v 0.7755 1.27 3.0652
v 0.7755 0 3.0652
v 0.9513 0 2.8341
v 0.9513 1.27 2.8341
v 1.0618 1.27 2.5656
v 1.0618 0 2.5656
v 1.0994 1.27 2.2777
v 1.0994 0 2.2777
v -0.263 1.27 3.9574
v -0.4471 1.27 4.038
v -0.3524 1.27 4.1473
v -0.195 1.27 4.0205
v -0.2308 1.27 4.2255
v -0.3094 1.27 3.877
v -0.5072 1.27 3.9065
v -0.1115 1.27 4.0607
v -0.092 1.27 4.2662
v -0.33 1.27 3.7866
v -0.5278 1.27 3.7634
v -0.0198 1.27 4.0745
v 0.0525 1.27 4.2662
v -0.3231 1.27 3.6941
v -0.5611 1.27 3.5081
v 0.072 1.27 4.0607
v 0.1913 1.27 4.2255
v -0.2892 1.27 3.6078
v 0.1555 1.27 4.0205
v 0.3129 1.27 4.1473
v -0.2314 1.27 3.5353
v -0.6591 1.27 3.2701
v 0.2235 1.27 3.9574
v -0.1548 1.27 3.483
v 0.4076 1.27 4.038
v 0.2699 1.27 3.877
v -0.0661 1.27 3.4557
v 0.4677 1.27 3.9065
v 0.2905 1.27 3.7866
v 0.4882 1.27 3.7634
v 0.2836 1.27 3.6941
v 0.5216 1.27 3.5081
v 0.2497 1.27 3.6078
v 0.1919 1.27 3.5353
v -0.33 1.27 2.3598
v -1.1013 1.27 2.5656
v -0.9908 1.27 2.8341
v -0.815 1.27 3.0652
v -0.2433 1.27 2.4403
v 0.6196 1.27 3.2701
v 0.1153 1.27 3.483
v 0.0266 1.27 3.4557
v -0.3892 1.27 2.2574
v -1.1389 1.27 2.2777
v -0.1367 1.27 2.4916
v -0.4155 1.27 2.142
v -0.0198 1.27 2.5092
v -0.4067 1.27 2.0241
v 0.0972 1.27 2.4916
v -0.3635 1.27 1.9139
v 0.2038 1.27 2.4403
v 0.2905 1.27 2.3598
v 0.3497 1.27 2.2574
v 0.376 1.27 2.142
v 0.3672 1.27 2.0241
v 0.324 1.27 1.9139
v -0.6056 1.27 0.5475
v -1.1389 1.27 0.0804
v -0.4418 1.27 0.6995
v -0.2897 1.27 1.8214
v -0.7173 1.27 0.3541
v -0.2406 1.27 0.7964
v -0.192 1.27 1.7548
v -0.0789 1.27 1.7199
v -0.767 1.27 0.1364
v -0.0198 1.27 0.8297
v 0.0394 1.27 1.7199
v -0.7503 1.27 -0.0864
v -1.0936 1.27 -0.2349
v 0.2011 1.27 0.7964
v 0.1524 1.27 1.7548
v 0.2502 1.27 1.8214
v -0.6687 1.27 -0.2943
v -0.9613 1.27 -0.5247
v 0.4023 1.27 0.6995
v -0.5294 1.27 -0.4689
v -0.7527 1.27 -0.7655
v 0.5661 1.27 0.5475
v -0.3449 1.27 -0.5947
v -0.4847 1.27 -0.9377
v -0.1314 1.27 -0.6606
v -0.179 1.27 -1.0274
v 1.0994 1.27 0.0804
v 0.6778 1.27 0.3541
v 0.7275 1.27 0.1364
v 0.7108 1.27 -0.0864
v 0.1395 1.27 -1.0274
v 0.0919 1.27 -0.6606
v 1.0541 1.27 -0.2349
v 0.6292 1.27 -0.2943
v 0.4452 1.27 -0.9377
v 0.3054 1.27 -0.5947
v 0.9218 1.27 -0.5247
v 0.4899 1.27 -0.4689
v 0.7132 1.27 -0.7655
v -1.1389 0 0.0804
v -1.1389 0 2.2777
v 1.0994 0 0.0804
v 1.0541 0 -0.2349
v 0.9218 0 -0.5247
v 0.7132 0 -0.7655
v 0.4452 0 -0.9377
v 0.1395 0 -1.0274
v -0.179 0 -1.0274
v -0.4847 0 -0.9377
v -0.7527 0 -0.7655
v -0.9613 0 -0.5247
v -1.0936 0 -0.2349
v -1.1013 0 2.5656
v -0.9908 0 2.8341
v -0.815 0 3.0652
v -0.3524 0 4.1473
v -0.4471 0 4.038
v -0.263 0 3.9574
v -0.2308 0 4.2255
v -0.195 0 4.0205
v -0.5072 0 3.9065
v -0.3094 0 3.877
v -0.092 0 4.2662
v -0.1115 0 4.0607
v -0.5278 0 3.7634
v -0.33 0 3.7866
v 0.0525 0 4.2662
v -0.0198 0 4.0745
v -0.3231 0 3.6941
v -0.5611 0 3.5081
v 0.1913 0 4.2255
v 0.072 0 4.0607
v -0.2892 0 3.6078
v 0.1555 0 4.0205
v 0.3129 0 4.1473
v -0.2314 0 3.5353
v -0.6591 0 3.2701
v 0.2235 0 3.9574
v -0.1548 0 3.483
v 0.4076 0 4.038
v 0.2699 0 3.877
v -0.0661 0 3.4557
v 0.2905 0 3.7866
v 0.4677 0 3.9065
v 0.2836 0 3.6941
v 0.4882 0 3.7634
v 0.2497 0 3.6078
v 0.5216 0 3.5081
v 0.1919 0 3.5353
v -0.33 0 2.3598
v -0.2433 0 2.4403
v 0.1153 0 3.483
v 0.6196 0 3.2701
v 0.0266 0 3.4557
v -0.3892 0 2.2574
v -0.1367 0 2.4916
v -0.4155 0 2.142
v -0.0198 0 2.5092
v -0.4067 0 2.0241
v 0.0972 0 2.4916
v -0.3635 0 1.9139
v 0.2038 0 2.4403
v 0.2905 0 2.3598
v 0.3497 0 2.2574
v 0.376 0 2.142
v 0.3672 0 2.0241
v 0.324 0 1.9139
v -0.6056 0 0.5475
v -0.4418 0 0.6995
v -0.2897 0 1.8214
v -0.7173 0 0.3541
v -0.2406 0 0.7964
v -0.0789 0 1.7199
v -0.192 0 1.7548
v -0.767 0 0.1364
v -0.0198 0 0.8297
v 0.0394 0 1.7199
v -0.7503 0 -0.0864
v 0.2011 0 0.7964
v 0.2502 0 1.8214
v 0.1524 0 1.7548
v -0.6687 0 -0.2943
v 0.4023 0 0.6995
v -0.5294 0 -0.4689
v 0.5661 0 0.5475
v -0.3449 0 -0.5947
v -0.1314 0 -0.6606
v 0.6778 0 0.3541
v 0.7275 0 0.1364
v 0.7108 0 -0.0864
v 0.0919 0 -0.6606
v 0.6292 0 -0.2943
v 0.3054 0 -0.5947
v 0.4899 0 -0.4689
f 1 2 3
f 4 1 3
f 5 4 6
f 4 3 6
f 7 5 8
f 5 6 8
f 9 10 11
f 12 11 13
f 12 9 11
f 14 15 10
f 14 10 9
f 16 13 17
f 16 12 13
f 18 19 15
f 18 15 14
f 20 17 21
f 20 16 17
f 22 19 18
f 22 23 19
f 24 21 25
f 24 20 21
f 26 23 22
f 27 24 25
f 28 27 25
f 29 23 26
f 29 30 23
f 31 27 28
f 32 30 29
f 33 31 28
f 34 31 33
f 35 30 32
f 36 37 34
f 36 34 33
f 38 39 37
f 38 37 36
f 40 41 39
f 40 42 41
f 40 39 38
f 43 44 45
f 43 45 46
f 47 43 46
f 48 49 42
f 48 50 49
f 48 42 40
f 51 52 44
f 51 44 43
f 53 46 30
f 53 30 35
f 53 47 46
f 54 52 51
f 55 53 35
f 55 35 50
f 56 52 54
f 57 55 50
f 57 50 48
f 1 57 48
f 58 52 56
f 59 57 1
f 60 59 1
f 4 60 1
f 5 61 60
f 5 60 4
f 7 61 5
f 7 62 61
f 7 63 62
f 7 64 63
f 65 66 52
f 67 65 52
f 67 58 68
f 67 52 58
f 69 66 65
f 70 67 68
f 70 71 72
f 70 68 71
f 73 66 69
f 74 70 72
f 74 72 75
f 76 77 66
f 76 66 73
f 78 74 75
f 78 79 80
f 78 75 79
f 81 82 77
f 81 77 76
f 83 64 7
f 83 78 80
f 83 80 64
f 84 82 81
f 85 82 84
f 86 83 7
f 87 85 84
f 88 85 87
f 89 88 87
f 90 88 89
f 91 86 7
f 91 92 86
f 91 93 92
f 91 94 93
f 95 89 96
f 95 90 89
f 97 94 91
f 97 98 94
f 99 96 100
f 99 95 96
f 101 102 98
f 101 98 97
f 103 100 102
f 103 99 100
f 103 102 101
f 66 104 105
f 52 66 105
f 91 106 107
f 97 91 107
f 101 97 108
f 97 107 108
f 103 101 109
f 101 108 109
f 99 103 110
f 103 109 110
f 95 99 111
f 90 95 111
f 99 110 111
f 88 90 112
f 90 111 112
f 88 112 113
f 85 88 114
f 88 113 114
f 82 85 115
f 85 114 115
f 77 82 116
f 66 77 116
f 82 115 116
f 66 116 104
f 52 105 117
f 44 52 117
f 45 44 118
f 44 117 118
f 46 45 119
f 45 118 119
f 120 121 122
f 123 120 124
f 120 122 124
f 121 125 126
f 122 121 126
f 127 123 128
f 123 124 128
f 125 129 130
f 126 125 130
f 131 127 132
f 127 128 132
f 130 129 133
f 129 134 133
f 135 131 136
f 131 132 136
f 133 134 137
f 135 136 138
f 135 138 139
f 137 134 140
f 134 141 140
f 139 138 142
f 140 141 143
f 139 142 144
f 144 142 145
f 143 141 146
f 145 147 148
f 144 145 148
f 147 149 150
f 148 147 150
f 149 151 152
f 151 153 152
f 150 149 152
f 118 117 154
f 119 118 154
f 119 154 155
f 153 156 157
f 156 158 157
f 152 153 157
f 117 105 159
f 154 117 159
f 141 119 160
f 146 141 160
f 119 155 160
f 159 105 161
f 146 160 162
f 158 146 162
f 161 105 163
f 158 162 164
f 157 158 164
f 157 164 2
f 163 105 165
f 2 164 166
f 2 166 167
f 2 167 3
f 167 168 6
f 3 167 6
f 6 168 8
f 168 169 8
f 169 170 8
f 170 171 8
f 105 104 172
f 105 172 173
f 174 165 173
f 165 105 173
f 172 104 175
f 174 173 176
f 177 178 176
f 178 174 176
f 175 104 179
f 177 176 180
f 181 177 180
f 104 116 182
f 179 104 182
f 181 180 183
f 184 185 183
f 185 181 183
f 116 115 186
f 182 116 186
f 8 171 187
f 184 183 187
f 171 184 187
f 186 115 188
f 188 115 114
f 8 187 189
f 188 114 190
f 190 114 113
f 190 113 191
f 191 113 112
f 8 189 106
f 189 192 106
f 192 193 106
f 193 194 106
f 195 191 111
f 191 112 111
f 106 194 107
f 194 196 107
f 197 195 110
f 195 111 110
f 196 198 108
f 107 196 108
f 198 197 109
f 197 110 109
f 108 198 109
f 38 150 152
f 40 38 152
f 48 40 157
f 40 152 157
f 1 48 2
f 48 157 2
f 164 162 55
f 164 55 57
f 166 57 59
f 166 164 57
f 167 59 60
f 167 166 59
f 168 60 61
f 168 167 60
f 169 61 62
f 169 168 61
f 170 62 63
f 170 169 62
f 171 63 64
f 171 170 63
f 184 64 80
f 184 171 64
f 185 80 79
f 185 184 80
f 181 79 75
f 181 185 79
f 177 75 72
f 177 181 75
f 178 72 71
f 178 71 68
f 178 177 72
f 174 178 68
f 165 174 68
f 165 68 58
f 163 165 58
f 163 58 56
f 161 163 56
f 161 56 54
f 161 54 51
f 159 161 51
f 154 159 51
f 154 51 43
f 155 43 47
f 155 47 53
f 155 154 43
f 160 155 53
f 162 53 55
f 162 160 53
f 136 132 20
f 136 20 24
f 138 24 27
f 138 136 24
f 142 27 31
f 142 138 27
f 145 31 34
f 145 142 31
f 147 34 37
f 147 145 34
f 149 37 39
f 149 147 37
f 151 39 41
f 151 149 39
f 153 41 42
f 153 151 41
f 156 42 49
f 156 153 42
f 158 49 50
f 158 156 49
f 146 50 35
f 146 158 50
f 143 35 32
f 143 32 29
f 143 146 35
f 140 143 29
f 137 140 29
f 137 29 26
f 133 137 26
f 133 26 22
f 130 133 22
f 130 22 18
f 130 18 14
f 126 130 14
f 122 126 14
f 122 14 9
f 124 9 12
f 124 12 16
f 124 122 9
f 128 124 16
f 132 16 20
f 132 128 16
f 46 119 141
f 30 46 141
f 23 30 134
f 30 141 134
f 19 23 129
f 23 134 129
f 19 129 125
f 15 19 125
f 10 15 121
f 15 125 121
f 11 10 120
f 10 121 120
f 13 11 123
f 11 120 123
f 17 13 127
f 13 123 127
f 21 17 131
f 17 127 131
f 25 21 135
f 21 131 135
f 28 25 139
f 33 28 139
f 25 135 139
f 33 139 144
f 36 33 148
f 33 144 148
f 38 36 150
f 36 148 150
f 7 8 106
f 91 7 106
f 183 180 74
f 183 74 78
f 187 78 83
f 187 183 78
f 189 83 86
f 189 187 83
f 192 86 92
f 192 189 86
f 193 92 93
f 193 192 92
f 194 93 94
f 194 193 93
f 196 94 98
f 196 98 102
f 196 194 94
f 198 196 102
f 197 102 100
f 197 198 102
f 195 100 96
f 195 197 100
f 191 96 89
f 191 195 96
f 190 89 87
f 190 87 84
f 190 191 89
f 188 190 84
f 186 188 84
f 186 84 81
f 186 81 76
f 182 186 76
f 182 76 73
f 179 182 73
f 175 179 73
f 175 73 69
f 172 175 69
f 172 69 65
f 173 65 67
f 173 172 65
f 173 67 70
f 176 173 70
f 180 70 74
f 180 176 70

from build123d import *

# Parameters (mm, degrees)
SKETCH1_R           = 0.396875
SKETCH1_R_2         = 0.7493
SKETCH1_R_3         = 0.508
SKETCH1_R_4         = 0.31115
BOSS_EXTRUDE1_DEPTH = 1.27


with BuildPart() as part:
    # Sketch1 → Boss-Extrude1 (new body)
    # profile 1 of 2: a face of its own
    with BuildSketch(Plane(origin=(0, 0, 0), x_dir=(1, 0, 0), z_dir=(0, 1, 0))):
        with BuildLine():
            ThreePointArc((1.099434588, -0.080366688), (-0.019752912, 1.038820812), (-1.138940412, -0.080366688))
            Line((-1.138940412, -0.080366688), (-1.138940412, -2.277654113))
            ThreePointArc((-1.138940412, -2.277654113), (-1.054782424, -2.703441113), (-0.814965083, -3.065193486))
            ThreePointArc((-0.814965083, -3.065193486), (-0.602361057, -3.385895944), (-0.527752912, -3.763366688))
            ThreePointArc((-0.527752912, -3.763366688), (-0.019752912, -3.255366688), (0.488247088, -3.763366688))
            ThreePointArc((0.488247088, -3.763366688), (0.562855233, -3.385895944), (0.775459259, -3.065193486))
            ThreePointArc((0.775459259, -3.065193486), (1.0152766, -2.703441113), (1.099434588, -2.277654113))
            Line((1.099434588, -2.277654113), (1.099434588, -0.080366688))
        make_face()
        with Locations(Location((-0.019752912, -2.112366688, 0), (0, 0, 270))):
            Circle(SKETCH1_R, mode=Mode.SUBTRACT)
        with Locations(Location((-0.019752912, -0.080366688, 0), (0, 0, 270))):
            Circle(SKETCH1_R_2, mode=Mode.SUBTRACT)
    # profile 2 of 2: a face of its own
    with BuildSketch(Plane(origin=(0, 0, 0), x_dir=(1, 0, 0), z_dir=(0, 1, 0))):
        with Locations((-0.019752912, -3.763366688)):
            Circle(SKETCH1_R_3)
        with Locations(Location((-0.019752912, -3.763366688, 0), (0, 0, 270))):
            Circle(SKETCH1_R_4, mode=Mode.SUBTRACT)
    extrude(amount=BOSS_EXTRUDE1_DEPTH)


solid = part.part
